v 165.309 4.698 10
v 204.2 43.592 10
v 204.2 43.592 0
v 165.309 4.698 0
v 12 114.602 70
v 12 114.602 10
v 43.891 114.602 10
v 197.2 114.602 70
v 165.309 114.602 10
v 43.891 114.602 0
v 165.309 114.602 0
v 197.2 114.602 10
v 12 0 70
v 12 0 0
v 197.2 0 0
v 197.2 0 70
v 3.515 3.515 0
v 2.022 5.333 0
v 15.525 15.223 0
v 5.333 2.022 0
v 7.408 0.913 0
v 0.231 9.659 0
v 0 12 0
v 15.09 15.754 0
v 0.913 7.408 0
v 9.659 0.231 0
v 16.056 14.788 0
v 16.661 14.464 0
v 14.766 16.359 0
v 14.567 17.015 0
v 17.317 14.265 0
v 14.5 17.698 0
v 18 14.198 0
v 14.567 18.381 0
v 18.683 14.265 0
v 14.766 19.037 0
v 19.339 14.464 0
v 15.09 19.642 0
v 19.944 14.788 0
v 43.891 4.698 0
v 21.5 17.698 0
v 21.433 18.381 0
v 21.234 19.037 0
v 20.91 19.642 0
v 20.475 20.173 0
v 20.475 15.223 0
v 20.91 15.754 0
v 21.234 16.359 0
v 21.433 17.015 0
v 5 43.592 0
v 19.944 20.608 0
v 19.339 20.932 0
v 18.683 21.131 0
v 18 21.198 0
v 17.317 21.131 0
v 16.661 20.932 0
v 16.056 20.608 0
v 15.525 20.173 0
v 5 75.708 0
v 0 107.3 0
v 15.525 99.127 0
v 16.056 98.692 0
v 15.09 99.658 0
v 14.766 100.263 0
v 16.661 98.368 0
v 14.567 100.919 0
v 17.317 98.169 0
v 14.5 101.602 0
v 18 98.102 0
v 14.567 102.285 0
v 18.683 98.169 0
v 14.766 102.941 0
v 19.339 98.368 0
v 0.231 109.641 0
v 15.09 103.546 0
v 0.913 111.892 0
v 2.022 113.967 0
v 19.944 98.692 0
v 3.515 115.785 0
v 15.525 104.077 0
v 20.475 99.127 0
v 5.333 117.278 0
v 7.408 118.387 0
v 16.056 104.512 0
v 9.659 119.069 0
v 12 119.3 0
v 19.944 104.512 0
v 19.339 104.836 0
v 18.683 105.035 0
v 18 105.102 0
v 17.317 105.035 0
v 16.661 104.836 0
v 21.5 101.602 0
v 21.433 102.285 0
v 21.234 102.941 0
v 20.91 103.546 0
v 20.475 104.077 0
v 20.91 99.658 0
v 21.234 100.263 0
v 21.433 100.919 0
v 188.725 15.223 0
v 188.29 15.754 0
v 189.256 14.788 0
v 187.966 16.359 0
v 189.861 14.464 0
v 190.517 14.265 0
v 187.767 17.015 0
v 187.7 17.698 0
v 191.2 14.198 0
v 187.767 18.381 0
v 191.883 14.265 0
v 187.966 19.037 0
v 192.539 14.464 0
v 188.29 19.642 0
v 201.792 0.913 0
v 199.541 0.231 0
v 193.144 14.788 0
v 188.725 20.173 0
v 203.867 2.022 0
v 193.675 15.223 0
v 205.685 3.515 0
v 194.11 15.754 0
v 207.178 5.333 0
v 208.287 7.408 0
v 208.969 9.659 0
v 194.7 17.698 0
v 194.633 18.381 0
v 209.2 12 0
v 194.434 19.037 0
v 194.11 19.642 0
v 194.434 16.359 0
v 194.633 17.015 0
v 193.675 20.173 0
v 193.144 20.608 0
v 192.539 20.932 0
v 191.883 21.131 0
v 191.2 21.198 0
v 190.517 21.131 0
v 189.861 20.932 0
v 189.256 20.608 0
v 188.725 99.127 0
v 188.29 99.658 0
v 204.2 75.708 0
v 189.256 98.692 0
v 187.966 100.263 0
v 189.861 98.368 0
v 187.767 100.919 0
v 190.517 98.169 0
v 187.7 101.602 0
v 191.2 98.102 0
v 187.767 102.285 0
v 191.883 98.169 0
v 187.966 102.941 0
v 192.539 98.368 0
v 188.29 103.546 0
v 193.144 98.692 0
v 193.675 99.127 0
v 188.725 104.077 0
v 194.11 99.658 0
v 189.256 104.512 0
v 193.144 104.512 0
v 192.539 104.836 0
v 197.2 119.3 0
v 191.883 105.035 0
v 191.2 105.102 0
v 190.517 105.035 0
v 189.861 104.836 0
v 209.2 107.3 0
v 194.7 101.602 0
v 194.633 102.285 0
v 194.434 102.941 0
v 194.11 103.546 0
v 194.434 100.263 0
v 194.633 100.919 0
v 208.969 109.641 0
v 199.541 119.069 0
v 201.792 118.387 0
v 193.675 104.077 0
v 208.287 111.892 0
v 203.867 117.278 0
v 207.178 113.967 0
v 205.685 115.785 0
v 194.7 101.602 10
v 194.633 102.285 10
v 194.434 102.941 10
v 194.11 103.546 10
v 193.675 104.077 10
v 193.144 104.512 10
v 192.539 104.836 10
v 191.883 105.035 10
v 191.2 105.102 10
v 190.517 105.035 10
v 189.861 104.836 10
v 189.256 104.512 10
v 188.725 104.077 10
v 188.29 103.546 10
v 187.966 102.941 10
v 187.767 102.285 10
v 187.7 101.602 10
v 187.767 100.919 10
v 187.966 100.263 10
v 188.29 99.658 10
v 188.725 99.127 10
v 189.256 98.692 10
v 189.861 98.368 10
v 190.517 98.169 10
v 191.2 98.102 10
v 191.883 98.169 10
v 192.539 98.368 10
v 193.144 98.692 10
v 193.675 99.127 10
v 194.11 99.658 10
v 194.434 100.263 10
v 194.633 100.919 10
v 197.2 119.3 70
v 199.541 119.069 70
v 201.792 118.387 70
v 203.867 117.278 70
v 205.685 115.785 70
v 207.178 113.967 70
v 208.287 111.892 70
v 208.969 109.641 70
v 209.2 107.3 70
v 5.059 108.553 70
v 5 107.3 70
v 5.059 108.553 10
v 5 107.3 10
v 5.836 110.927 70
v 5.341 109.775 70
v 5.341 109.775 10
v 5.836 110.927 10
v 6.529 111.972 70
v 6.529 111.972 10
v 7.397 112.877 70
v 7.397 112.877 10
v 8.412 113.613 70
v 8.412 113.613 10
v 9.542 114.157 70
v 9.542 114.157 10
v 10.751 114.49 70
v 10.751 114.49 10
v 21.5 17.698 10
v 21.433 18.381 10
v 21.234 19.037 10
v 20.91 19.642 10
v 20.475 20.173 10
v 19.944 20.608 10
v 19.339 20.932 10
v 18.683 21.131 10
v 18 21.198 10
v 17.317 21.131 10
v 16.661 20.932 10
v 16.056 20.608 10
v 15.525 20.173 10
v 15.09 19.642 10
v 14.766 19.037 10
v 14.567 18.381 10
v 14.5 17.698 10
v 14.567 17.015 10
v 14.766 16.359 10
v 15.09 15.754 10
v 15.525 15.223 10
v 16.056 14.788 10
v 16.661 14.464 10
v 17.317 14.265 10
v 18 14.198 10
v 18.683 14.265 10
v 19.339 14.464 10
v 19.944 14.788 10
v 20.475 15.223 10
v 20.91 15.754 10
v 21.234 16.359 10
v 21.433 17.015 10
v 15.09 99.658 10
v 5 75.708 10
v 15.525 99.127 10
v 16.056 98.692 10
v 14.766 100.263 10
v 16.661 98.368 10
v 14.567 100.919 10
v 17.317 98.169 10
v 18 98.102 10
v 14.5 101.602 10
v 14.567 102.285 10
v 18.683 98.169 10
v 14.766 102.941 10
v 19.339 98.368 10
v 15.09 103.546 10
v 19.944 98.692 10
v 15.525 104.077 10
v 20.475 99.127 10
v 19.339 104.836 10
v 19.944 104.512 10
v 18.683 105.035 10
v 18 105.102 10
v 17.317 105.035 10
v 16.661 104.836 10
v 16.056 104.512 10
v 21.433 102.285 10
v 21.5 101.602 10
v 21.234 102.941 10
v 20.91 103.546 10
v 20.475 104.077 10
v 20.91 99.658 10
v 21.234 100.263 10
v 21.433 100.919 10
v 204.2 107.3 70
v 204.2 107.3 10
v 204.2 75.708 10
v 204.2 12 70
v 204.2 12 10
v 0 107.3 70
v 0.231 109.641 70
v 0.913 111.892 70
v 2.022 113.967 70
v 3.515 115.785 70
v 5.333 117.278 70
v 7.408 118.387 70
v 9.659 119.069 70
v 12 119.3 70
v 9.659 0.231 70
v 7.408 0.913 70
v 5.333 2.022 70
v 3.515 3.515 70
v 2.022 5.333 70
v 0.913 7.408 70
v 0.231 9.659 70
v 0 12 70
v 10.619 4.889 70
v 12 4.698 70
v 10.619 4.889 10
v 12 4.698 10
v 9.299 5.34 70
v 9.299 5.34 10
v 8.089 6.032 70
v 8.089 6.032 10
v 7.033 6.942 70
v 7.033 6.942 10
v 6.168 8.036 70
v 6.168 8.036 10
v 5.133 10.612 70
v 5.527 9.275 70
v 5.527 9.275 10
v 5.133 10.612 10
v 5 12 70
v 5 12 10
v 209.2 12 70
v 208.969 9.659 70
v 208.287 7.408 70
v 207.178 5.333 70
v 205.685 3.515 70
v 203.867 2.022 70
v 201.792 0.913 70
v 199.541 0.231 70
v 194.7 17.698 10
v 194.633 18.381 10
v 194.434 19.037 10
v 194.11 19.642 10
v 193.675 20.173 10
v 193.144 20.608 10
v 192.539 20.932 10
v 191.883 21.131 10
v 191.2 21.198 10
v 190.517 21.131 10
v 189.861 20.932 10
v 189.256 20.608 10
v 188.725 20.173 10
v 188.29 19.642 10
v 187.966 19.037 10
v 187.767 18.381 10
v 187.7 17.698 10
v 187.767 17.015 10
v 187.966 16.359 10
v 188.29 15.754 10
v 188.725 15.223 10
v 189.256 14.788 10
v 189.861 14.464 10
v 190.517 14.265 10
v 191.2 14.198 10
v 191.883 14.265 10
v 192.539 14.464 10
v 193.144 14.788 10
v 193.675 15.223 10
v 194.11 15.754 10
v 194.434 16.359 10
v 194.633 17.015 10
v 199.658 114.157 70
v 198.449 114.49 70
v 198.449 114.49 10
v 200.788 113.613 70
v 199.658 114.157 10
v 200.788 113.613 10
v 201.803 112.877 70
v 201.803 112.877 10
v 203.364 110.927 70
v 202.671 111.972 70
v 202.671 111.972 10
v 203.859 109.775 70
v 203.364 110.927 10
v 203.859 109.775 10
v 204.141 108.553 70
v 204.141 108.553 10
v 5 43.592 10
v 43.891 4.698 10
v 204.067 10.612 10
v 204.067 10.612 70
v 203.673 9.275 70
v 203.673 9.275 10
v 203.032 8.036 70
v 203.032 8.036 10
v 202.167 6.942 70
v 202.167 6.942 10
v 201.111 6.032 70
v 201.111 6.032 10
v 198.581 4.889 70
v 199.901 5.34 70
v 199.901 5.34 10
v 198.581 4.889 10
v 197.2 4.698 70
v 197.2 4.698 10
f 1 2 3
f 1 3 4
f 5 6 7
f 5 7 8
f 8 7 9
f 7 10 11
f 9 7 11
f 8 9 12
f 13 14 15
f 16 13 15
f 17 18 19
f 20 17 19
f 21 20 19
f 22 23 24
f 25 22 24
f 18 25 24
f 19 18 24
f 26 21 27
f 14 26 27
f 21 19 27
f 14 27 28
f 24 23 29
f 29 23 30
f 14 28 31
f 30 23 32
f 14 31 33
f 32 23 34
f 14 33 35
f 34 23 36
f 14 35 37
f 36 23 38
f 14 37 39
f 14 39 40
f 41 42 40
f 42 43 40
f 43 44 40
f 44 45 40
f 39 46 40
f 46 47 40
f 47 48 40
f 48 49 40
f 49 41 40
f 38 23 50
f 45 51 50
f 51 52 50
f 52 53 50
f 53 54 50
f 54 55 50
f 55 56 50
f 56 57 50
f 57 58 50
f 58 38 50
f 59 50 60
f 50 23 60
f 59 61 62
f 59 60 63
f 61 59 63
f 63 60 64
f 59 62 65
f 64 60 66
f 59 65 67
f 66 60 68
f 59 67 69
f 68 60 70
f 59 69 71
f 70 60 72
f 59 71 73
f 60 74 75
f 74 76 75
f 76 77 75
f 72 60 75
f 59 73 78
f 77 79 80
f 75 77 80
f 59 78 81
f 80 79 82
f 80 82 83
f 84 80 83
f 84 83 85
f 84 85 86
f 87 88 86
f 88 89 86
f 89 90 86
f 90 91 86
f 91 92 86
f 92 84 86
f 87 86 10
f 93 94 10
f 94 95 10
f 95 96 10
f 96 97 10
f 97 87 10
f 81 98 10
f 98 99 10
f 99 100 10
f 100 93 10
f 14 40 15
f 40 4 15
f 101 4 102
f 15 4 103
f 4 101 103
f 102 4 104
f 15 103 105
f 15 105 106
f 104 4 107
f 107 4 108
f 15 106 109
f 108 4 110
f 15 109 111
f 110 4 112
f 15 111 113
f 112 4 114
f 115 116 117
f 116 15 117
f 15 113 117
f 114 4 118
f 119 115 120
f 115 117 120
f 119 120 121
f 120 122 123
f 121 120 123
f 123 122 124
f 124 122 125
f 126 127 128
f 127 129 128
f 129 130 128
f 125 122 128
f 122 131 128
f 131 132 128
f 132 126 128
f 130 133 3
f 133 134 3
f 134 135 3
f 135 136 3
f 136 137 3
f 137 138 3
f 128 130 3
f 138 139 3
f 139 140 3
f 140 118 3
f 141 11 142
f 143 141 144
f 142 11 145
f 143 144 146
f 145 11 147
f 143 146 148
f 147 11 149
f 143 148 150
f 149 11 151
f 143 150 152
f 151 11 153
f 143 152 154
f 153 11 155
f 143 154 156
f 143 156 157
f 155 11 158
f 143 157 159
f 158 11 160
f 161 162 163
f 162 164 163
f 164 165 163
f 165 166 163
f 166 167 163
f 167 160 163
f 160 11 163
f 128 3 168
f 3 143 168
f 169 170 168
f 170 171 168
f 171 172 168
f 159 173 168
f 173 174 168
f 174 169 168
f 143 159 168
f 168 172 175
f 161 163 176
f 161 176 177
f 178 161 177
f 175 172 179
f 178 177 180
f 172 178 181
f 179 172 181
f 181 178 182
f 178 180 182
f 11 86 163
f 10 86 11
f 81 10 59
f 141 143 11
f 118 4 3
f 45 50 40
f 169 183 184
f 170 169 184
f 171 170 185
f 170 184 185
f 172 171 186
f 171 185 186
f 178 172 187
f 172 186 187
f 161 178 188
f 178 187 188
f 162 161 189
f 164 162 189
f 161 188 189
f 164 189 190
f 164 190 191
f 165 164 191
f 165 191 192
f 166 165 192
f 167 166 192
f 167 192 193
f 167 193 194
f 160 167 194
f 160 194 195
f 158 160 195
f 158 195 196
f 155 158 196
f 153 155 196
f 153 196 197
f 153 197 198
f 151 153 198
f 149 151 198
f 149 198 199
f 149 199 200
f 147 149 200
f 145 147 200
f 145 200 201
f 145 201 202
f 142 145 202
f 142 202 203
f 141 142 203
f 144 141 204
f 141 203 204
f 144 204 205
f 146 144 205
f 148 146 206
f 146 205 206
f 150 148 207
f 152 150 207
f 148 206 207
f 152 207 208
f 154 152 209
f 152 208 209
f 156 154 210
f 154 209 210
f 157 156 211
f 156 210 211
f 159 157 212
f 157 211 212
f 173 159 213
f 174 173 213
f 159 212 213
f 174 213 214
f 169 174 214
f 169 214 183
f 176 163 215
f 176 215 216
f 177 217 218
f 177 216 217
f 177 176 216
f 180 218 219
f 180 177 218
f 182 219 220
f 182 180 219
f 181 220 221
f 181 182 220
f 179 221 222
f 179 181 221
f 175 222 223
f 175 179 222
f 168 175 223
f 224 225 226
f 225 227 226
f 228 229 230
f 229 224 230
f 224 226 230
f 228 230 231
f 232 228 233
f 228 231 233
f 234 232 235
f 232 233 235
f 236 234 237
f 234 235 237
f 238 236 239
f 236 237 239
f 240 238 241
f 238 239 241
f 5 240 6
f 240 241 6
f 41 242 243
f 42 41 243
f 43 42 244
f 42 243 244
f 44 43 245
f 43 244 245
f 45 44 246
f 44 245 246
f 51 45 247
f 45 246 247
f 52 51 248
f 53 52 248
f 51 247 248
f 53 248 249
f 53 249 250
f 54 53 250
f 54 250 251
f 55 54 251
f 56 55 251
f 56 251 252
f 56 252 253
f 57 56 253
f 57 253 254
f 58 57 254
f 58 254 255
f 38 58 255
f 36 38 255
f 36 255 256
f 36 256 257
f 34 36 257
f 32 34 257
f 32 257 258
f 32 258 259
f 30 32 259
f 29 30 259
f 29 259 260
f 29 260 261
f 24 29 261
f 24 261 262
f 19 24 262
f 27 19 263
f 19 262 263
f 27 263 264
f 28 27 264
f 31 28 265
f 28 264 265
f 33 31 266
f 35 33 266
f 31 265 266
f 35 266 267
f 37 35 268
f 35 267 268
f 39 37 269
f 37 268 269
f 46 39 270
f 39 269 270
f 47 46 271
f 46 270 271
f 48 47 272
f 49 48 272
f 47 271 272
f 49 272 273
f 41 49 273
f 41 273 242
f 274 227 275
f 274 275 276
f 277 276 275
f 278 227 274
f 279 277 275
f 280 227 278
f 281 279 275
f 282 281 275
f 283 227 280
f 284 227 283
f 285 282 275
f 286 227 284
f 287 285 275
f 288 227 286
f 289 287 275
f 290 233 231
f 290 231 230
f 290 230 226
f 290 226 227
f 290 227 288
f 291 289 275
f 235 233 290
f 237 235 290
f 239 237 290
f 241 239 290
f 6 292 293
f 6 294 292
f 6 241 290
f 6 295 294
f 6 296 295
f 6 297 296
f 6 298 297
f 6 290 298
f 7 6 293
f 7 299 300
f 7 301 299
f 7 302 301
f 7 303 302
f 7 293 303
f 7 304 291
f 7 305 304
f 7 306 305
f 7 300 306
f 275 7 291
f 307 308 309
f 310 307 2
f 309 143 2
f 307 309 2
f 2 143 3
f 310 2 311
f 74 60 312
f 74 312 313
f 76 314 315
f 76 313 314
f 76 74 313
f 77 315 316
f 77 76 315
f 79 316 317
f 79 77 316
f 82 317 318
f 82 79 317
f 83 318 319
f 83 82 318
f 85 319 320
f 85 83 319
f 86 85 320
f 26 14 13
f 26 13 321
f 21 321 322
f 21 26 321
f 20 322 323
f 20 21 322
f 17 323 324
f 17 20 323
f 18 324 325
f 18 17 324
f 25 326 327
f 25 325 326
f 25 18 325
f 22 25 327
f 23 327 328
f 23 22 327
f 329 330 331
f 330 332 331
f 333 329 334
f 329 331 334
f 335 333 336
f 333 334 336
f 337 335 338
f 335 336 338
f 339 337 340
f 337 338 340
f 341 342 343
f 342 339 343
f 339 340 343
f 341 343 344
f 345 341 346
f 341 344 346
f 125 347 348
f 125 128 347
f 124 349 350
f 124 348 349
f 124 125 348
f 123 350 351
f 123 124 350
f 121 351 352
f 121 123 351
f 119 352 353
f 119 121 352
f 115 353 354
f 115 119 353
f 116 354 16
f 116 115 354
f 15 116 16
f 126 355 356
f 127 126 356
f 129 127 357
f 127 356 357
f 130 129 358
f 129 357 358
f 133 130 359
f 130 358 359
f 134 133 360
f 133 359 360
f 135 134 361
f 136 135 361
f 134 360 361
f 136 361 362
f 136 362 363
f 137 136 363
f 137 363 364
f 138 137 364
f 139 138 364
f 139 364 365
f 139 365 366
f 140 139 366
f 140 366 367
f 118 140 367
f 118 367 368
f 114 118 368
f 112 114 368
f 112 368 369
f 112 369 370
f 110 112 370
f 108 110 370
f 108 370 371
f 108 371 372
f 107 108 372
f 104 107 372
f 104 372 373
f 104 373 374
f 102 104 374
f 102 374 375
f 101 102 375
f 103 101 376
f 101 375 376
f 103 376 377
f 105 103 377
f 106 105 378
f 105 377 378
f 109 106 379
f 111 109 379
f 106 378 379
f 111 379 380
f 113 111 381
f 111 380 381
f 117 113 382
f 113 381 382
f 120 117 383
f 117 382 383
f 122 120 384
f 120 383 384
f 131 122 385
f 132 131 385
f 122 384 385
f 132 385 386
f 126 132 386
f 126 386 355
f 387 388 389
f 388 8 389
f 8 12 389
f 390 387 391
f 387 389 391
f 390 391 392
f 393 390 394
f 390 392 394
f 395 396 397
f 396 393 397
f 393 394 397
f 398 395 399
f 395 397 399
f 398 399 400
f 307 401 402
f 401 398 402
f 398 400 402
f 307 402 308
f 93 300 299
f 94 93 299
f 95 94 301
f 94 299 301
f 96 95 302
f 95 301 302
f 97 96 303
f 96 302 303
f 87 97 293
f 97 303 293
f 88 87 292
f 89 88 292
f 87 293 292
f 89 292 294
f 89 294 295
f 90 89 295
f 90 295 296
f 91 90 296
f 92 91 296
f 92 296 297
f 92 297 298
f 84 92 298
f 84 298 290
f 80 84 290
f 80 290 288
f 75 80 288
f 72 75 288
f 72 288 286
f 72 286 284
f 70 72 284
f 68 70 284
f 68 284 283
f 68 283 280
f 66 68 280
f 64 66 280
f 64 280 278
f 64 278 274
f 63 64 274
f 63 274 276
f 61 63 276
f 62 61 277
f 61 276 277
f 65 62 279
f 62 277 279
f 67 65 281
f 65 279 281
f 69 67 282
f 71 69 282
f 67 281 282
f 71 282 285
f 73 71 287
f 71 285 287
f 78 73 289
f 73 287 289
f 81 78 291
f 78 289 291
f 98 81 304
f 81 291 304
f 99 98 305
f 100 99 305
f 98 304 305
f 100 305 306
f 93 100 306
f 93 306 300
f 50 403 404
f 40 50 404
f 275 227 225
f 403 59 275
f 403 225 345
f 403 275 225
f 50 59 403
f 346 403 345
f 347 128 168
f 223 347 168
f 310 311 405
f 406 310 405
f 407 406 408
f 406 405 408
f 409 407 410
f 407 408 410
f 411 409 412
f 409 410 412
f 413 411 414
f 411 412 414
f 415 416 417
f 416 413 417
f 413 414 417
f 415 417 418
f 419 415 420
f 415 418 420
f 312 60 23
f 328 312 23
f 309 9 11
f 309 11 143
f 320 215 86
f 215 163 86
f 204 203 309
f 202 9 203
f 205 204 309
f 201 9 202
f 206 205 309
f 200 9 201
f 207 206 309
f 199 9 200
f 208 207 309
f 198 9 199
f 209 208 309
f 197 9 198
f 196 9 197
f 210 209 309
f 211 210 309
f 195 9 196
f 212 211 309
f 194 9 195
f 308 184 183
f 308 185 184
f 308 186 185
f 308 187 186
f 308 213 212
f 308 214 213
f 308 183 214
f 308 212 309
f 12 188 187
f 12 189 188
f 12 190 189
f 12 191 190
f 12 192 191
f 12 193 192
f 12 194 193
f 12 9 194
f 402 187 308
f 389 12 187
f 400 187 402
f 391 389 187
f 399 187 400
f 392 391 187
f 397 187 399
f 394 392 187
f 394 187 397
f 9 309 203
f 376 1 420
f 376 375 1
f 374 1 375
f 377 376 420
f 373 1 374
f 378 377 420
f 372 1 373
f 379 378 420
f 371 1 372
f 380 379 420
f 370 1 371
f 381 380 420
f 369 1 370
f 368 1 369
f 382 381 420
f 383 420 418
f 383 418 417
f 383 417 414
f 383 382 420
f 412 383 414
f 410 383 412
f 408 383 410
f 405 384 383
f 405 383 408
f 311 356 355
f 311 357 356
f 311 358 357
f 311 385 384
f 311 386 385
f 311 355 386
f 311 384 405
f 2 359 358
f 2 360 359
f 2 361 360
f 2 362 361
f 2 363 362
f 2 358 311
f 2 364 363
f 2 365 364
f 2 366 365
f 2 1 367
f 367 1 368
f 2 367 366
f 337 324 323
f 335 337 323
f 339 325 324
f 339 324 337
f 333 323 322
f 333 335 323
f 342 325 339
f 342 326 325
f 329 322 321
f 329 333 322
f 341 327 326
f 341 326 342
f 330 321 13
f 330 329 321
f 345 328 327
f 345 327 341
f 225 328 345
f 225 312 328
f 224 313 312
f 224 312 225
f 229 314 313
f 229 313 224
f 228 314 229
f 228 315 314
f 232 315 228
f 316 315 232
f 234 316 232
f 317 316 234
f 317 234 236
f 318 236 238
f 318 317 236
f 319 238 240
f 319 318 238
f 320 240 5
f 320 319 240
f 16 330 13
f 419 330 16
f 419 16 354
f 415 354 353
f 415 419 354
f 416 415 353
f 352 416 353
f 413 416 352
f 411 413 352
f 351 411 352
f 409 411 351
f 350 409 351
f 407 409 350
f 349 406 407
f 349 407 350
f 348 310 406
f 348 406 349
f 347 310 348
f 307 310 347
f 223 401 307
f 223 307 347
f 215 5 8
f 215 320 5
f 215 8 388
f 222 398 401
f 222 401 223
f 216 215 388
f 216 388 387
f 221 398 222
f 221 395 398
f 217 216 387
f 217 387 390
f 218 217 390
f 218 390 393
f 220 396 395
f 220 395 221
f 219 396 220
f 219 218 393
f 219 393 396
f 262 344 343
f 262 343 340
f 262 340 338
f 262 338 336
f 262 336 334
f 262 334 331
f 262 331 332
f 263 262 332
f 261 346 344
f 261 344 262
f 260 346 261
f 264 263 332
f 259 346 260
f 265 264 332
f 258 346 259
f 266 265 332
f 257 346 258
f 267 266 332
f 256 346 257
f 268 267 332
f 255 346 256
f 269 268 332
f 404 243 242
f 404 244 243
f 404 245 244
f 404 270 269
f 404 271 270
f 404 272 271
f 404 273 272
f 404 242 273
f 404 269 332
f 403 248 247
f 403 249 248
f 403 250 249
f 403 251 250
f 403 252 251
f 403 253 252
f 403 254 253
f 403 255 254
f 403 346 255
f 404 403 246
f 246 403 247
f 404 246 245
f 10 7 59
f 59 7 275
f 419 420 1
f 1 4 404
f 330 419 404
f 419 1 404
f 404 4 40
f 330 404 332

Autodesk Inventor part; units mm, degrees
ref_plane "YZ Plane" through (0, 0, 0) normal (1, 0, 0) x (0, 1, 0)
ref_plane "XZ Plane" through (0, 0, 0) normal (0, 1, 0) x (-1, 0, 0)
ref_plane "XY Plane" through (0, 0, 0) normal (0, 0, 1) x (1, 0, 0)
sketch "Sketch1" plane through (0, 0, 0) normal (0, 0, 1) x (1, 0, 0)
  line L0 (0, 0) -> (209.2, 0)
  line L1 (209.2, 0) -> (209.2, 119.3)
  line L2 (209.2, 119.3) -> (0, 119.3)
  line L3 (0, 119.3) -> (0, 0)
  dimension "d0" = 209.2
  dimension "d1" = 119.3
extrude "Extrusion1" add sketch "Sketch1" along normal blind 10
fillet "Fillet1" radius 12 4 edges at (209.2, 119.3, 5) (209.2, 0, 5) (0, 119.3, 5) (0, 0, 5)
sketch "Sketch3" plane through (0, 0, 10) normal (0, 0, 1) x (1, 0, 0)
  circle A0 centre (18, 101.602) radius 3.5
  line L0 (0, 107.3) -> (0, 12) projected
  line L1 (197.2, 119.3) -> (12, 119.3) projected
  line L2 (197.2, 119.3) -> (12, 119.3) construction
  line L3 (104.6, 119.3) -> (104.6, 0) construction
  line L4 (12, 0) -> (197.2, 0) construction
  circle A1 centre (191.2, 101.602) radius 3.5
  line L5 (0, 59.65) -> (209.2, 59.65) construction
  line L6 (209.2, 12) -> (209.2, 107.3) construction
  circle A2 centre (18, 17.698) radius 3.5
  circle A3 centre (191.2, 17.698) radius 3.5
  point P0 (0, 0)
  dimension "d16" = 7
  dimension "d17" = 18
  dimension "d18" = 17.698
extrude "Extrusion3" cut sketch "Sketch3" against normal through all
sketch "Sketch4" plane through (0, 0, 10) normal (0, 0, 1) x (1, 0, 0)
  circle A0 centre (18, 101.602) radius 3.5 construction
  line L0 (18, 101.602) -> (18, 119.3) construction
  line L1 (12, 119.3) -> (24, 119.3)
  arc A1 (12, 119.3) -> (0, 107.3) centre (12, 107.3) ccw projected
  line L2 (0, 107.3) -> (0, 95.3)
  line L3 (197.2, 119.3) -> (12, 119.3) construction
  line L4 (104.6, 119.3) -> (104.6, 0) construction
  line L5 (12, 0) -> (197.2, 0) construction
  line L6 (0, 107.3) -> (0, 12) construction
  line L7 (0, 59.65) -> (209.2, 59.65) construction
  line L8 (209.2, 12) -> (209.2, 107.3) construction
  line L9 (191.2, 101.602) -> (191.2, 119.3) construction
  line L10 (197.2, 119.3) -> (185.2, 119.3)
  arc A2 (209.2, 107.3) -> (197.2, 119.3) centre (197.2, 107.3) ccw
  line L11 (209.2, 107.3) -> (209.2, 95.3)
  line L12 (12, 0) -> (24, 0)
  arc A3 (0, 12) -> (12, 0) centre (12, 12) ccw
  line L13 (0, 12) -> (0, 24)
  line L14 (197.2, 0) -> (12, 0) construction
  line L15 (197.2, 0) -> (185.2, 0)
  line L16 (209.2, 12) -> (209.2, 24)
  arc A4 (197.2, 0) -> (209.2, 12) centre (197.2, 12) ccw
  line L17 (24, 0) -> (185.2, 0)
  line L18 (0, 95.3) -> (0, 24)
  line L19 (209.2, 93.9155) -> (209.2, 24)
  line L20 (209.2, 12) -> (209.2, 107.3) projected
  line L21 (197.2, 119.3) -> (12, 119.3) projected
  line L22 (24, 119.3) -> (197.2, 119.3)
  point P0 (0, 0)
  point P1 (104.6, 107.3)
  point P2 (12, 59.65)
  point P3 (18, 17.698)
  point P4 (191.2, 17.698)
  dimension "d21" = 12
  dimension "d22" = 12
extrude "Extrusion4" cut sketch "Sketch4" against normal blind 10 keep common part
sketch "Sketch5" plane through (0, 0, 10) normal (0, 0, 1) x (1, 0, 0)
  line L0 (43.891, 114.602) -> (165.309, 114.602)
  line L1 (43.891, 4.698) -> (165.309, 4.698)
  line L2 (12, 0) -> (197.2, 0) projected
  line L3 (104.6, 107.3) -> (104.6, 0) construction
  line L4 (43.891, 114.602) -> (5, 75.7075)
  line L5 (5, 43.5925) -> (5, 75.7075)
  line L6 (5, 43.5925) -> (43.891, 4.698)
  line L7 (165.309, 114.602) -> (204.2, 75.7075)
  line L8 (204.2, 43.5925) -> (204.2, 75.7075)
  line L9 (204.2, 43.5925) -> (165.309, 4.698)
  line L10 (0, 107.3) -> (0, 12) projected
  line L11 (0, 59.65) -> (209.2, 59.65) construction
  line L12 (209.2, 12) -> (209.2, 107.3) construction
  line L13 (197.2, 119.3) -> (12, 119.3) construction
  point P0 (0, 0)
  point P1 (104.6, 114.602)
  point P2 (5, 59.65)
  dimension "d25" = 4.698
  dimension "d27" = 121.418
  dimension "d37" = 5
  dimension "d38" = 32.115
  dimension "d39" = 4.698
extrude "Extrusion5" cut sketch "Sketch5" against normal through all
sketch "Sketch8" plane through (0, 0, 10) normal (0, 0, 1) x (1, 0, 0)
  line L0 (197.2, 119.3) -> (12, 119.3) projected
  line L1 (12, 119.3) -> (197.2, 119.3)
  line L2 (209.2, 12) -> (209.2, 107.3) projected
  line L3 (209.2, 107.3) -> (209.2, 12)
  line L4 (12, 0) -> (197.2, 0) projected
  line L5 (197.2, 0) -> (12, 0)
  line L6 (0, 107.3) -> (0, 12) projected
  line L7 (0, 107.3) -> (0, 12)
  arc A0 (12, 119.3) -> (0, 107.3) centre (12, 107.3) ccw projected
  arc A1 (209.2, 107.3) -> (197.2, 119.3) centre (197.2, 107.3) ccw projected
  arc A2 (197.2, 0) -> (209.2, 12) centre (197.2, 12) ccw projected
  arc A3 (0, 12) -> (12, 0) centre (12, 12) ccw projected
  line L8 (5, 75.7075) -> (5, 12)
  line L9 (5, 75.7075) -> (5, 107.3)
  line L10 (165.309, 4.698) -> (43.891, 4.698) projected
  line L11 (43.891, 4.698) -> (12, 4.698)
  line L12 (165.309, 4.698) -> (197.2, 4.698)
  line L13 (204.2, 43.5925) -> (204.2, 75.7075) projected
  line L14 (204.2, 75.7075) -> (204.2, 12)
  line L15 (204.2, 75.7075) -> (204.2, 107.3)
  line L16 (43.891, 114.602) -> (197.2, 114.602)
  line L17 (43.891, 114.602) -> (165.309, 114.602) projected
  line L18 (43.891, 114.602) -> (12, 114.602)
  arc A4 (5, 12) -> (12, 4.698) centre (12.3085, 12) ccw
  arc A5 (197.2, 4.698) -> (204.2, 12) centre (196.8915, 12) ccw
  arc A6 (204.2, 107.3) -> (197.2, 114.602) centre (197.2, 107.5958) ccw
  arc A7 (12, 114.602) -> (5, 107.3) centre (12, 107.5958) ccw
  point P0 (0, 0)
extrude "Extrusion7" add sketch "Sketch8" along normal blind 60
properties part number "THAD Back"
